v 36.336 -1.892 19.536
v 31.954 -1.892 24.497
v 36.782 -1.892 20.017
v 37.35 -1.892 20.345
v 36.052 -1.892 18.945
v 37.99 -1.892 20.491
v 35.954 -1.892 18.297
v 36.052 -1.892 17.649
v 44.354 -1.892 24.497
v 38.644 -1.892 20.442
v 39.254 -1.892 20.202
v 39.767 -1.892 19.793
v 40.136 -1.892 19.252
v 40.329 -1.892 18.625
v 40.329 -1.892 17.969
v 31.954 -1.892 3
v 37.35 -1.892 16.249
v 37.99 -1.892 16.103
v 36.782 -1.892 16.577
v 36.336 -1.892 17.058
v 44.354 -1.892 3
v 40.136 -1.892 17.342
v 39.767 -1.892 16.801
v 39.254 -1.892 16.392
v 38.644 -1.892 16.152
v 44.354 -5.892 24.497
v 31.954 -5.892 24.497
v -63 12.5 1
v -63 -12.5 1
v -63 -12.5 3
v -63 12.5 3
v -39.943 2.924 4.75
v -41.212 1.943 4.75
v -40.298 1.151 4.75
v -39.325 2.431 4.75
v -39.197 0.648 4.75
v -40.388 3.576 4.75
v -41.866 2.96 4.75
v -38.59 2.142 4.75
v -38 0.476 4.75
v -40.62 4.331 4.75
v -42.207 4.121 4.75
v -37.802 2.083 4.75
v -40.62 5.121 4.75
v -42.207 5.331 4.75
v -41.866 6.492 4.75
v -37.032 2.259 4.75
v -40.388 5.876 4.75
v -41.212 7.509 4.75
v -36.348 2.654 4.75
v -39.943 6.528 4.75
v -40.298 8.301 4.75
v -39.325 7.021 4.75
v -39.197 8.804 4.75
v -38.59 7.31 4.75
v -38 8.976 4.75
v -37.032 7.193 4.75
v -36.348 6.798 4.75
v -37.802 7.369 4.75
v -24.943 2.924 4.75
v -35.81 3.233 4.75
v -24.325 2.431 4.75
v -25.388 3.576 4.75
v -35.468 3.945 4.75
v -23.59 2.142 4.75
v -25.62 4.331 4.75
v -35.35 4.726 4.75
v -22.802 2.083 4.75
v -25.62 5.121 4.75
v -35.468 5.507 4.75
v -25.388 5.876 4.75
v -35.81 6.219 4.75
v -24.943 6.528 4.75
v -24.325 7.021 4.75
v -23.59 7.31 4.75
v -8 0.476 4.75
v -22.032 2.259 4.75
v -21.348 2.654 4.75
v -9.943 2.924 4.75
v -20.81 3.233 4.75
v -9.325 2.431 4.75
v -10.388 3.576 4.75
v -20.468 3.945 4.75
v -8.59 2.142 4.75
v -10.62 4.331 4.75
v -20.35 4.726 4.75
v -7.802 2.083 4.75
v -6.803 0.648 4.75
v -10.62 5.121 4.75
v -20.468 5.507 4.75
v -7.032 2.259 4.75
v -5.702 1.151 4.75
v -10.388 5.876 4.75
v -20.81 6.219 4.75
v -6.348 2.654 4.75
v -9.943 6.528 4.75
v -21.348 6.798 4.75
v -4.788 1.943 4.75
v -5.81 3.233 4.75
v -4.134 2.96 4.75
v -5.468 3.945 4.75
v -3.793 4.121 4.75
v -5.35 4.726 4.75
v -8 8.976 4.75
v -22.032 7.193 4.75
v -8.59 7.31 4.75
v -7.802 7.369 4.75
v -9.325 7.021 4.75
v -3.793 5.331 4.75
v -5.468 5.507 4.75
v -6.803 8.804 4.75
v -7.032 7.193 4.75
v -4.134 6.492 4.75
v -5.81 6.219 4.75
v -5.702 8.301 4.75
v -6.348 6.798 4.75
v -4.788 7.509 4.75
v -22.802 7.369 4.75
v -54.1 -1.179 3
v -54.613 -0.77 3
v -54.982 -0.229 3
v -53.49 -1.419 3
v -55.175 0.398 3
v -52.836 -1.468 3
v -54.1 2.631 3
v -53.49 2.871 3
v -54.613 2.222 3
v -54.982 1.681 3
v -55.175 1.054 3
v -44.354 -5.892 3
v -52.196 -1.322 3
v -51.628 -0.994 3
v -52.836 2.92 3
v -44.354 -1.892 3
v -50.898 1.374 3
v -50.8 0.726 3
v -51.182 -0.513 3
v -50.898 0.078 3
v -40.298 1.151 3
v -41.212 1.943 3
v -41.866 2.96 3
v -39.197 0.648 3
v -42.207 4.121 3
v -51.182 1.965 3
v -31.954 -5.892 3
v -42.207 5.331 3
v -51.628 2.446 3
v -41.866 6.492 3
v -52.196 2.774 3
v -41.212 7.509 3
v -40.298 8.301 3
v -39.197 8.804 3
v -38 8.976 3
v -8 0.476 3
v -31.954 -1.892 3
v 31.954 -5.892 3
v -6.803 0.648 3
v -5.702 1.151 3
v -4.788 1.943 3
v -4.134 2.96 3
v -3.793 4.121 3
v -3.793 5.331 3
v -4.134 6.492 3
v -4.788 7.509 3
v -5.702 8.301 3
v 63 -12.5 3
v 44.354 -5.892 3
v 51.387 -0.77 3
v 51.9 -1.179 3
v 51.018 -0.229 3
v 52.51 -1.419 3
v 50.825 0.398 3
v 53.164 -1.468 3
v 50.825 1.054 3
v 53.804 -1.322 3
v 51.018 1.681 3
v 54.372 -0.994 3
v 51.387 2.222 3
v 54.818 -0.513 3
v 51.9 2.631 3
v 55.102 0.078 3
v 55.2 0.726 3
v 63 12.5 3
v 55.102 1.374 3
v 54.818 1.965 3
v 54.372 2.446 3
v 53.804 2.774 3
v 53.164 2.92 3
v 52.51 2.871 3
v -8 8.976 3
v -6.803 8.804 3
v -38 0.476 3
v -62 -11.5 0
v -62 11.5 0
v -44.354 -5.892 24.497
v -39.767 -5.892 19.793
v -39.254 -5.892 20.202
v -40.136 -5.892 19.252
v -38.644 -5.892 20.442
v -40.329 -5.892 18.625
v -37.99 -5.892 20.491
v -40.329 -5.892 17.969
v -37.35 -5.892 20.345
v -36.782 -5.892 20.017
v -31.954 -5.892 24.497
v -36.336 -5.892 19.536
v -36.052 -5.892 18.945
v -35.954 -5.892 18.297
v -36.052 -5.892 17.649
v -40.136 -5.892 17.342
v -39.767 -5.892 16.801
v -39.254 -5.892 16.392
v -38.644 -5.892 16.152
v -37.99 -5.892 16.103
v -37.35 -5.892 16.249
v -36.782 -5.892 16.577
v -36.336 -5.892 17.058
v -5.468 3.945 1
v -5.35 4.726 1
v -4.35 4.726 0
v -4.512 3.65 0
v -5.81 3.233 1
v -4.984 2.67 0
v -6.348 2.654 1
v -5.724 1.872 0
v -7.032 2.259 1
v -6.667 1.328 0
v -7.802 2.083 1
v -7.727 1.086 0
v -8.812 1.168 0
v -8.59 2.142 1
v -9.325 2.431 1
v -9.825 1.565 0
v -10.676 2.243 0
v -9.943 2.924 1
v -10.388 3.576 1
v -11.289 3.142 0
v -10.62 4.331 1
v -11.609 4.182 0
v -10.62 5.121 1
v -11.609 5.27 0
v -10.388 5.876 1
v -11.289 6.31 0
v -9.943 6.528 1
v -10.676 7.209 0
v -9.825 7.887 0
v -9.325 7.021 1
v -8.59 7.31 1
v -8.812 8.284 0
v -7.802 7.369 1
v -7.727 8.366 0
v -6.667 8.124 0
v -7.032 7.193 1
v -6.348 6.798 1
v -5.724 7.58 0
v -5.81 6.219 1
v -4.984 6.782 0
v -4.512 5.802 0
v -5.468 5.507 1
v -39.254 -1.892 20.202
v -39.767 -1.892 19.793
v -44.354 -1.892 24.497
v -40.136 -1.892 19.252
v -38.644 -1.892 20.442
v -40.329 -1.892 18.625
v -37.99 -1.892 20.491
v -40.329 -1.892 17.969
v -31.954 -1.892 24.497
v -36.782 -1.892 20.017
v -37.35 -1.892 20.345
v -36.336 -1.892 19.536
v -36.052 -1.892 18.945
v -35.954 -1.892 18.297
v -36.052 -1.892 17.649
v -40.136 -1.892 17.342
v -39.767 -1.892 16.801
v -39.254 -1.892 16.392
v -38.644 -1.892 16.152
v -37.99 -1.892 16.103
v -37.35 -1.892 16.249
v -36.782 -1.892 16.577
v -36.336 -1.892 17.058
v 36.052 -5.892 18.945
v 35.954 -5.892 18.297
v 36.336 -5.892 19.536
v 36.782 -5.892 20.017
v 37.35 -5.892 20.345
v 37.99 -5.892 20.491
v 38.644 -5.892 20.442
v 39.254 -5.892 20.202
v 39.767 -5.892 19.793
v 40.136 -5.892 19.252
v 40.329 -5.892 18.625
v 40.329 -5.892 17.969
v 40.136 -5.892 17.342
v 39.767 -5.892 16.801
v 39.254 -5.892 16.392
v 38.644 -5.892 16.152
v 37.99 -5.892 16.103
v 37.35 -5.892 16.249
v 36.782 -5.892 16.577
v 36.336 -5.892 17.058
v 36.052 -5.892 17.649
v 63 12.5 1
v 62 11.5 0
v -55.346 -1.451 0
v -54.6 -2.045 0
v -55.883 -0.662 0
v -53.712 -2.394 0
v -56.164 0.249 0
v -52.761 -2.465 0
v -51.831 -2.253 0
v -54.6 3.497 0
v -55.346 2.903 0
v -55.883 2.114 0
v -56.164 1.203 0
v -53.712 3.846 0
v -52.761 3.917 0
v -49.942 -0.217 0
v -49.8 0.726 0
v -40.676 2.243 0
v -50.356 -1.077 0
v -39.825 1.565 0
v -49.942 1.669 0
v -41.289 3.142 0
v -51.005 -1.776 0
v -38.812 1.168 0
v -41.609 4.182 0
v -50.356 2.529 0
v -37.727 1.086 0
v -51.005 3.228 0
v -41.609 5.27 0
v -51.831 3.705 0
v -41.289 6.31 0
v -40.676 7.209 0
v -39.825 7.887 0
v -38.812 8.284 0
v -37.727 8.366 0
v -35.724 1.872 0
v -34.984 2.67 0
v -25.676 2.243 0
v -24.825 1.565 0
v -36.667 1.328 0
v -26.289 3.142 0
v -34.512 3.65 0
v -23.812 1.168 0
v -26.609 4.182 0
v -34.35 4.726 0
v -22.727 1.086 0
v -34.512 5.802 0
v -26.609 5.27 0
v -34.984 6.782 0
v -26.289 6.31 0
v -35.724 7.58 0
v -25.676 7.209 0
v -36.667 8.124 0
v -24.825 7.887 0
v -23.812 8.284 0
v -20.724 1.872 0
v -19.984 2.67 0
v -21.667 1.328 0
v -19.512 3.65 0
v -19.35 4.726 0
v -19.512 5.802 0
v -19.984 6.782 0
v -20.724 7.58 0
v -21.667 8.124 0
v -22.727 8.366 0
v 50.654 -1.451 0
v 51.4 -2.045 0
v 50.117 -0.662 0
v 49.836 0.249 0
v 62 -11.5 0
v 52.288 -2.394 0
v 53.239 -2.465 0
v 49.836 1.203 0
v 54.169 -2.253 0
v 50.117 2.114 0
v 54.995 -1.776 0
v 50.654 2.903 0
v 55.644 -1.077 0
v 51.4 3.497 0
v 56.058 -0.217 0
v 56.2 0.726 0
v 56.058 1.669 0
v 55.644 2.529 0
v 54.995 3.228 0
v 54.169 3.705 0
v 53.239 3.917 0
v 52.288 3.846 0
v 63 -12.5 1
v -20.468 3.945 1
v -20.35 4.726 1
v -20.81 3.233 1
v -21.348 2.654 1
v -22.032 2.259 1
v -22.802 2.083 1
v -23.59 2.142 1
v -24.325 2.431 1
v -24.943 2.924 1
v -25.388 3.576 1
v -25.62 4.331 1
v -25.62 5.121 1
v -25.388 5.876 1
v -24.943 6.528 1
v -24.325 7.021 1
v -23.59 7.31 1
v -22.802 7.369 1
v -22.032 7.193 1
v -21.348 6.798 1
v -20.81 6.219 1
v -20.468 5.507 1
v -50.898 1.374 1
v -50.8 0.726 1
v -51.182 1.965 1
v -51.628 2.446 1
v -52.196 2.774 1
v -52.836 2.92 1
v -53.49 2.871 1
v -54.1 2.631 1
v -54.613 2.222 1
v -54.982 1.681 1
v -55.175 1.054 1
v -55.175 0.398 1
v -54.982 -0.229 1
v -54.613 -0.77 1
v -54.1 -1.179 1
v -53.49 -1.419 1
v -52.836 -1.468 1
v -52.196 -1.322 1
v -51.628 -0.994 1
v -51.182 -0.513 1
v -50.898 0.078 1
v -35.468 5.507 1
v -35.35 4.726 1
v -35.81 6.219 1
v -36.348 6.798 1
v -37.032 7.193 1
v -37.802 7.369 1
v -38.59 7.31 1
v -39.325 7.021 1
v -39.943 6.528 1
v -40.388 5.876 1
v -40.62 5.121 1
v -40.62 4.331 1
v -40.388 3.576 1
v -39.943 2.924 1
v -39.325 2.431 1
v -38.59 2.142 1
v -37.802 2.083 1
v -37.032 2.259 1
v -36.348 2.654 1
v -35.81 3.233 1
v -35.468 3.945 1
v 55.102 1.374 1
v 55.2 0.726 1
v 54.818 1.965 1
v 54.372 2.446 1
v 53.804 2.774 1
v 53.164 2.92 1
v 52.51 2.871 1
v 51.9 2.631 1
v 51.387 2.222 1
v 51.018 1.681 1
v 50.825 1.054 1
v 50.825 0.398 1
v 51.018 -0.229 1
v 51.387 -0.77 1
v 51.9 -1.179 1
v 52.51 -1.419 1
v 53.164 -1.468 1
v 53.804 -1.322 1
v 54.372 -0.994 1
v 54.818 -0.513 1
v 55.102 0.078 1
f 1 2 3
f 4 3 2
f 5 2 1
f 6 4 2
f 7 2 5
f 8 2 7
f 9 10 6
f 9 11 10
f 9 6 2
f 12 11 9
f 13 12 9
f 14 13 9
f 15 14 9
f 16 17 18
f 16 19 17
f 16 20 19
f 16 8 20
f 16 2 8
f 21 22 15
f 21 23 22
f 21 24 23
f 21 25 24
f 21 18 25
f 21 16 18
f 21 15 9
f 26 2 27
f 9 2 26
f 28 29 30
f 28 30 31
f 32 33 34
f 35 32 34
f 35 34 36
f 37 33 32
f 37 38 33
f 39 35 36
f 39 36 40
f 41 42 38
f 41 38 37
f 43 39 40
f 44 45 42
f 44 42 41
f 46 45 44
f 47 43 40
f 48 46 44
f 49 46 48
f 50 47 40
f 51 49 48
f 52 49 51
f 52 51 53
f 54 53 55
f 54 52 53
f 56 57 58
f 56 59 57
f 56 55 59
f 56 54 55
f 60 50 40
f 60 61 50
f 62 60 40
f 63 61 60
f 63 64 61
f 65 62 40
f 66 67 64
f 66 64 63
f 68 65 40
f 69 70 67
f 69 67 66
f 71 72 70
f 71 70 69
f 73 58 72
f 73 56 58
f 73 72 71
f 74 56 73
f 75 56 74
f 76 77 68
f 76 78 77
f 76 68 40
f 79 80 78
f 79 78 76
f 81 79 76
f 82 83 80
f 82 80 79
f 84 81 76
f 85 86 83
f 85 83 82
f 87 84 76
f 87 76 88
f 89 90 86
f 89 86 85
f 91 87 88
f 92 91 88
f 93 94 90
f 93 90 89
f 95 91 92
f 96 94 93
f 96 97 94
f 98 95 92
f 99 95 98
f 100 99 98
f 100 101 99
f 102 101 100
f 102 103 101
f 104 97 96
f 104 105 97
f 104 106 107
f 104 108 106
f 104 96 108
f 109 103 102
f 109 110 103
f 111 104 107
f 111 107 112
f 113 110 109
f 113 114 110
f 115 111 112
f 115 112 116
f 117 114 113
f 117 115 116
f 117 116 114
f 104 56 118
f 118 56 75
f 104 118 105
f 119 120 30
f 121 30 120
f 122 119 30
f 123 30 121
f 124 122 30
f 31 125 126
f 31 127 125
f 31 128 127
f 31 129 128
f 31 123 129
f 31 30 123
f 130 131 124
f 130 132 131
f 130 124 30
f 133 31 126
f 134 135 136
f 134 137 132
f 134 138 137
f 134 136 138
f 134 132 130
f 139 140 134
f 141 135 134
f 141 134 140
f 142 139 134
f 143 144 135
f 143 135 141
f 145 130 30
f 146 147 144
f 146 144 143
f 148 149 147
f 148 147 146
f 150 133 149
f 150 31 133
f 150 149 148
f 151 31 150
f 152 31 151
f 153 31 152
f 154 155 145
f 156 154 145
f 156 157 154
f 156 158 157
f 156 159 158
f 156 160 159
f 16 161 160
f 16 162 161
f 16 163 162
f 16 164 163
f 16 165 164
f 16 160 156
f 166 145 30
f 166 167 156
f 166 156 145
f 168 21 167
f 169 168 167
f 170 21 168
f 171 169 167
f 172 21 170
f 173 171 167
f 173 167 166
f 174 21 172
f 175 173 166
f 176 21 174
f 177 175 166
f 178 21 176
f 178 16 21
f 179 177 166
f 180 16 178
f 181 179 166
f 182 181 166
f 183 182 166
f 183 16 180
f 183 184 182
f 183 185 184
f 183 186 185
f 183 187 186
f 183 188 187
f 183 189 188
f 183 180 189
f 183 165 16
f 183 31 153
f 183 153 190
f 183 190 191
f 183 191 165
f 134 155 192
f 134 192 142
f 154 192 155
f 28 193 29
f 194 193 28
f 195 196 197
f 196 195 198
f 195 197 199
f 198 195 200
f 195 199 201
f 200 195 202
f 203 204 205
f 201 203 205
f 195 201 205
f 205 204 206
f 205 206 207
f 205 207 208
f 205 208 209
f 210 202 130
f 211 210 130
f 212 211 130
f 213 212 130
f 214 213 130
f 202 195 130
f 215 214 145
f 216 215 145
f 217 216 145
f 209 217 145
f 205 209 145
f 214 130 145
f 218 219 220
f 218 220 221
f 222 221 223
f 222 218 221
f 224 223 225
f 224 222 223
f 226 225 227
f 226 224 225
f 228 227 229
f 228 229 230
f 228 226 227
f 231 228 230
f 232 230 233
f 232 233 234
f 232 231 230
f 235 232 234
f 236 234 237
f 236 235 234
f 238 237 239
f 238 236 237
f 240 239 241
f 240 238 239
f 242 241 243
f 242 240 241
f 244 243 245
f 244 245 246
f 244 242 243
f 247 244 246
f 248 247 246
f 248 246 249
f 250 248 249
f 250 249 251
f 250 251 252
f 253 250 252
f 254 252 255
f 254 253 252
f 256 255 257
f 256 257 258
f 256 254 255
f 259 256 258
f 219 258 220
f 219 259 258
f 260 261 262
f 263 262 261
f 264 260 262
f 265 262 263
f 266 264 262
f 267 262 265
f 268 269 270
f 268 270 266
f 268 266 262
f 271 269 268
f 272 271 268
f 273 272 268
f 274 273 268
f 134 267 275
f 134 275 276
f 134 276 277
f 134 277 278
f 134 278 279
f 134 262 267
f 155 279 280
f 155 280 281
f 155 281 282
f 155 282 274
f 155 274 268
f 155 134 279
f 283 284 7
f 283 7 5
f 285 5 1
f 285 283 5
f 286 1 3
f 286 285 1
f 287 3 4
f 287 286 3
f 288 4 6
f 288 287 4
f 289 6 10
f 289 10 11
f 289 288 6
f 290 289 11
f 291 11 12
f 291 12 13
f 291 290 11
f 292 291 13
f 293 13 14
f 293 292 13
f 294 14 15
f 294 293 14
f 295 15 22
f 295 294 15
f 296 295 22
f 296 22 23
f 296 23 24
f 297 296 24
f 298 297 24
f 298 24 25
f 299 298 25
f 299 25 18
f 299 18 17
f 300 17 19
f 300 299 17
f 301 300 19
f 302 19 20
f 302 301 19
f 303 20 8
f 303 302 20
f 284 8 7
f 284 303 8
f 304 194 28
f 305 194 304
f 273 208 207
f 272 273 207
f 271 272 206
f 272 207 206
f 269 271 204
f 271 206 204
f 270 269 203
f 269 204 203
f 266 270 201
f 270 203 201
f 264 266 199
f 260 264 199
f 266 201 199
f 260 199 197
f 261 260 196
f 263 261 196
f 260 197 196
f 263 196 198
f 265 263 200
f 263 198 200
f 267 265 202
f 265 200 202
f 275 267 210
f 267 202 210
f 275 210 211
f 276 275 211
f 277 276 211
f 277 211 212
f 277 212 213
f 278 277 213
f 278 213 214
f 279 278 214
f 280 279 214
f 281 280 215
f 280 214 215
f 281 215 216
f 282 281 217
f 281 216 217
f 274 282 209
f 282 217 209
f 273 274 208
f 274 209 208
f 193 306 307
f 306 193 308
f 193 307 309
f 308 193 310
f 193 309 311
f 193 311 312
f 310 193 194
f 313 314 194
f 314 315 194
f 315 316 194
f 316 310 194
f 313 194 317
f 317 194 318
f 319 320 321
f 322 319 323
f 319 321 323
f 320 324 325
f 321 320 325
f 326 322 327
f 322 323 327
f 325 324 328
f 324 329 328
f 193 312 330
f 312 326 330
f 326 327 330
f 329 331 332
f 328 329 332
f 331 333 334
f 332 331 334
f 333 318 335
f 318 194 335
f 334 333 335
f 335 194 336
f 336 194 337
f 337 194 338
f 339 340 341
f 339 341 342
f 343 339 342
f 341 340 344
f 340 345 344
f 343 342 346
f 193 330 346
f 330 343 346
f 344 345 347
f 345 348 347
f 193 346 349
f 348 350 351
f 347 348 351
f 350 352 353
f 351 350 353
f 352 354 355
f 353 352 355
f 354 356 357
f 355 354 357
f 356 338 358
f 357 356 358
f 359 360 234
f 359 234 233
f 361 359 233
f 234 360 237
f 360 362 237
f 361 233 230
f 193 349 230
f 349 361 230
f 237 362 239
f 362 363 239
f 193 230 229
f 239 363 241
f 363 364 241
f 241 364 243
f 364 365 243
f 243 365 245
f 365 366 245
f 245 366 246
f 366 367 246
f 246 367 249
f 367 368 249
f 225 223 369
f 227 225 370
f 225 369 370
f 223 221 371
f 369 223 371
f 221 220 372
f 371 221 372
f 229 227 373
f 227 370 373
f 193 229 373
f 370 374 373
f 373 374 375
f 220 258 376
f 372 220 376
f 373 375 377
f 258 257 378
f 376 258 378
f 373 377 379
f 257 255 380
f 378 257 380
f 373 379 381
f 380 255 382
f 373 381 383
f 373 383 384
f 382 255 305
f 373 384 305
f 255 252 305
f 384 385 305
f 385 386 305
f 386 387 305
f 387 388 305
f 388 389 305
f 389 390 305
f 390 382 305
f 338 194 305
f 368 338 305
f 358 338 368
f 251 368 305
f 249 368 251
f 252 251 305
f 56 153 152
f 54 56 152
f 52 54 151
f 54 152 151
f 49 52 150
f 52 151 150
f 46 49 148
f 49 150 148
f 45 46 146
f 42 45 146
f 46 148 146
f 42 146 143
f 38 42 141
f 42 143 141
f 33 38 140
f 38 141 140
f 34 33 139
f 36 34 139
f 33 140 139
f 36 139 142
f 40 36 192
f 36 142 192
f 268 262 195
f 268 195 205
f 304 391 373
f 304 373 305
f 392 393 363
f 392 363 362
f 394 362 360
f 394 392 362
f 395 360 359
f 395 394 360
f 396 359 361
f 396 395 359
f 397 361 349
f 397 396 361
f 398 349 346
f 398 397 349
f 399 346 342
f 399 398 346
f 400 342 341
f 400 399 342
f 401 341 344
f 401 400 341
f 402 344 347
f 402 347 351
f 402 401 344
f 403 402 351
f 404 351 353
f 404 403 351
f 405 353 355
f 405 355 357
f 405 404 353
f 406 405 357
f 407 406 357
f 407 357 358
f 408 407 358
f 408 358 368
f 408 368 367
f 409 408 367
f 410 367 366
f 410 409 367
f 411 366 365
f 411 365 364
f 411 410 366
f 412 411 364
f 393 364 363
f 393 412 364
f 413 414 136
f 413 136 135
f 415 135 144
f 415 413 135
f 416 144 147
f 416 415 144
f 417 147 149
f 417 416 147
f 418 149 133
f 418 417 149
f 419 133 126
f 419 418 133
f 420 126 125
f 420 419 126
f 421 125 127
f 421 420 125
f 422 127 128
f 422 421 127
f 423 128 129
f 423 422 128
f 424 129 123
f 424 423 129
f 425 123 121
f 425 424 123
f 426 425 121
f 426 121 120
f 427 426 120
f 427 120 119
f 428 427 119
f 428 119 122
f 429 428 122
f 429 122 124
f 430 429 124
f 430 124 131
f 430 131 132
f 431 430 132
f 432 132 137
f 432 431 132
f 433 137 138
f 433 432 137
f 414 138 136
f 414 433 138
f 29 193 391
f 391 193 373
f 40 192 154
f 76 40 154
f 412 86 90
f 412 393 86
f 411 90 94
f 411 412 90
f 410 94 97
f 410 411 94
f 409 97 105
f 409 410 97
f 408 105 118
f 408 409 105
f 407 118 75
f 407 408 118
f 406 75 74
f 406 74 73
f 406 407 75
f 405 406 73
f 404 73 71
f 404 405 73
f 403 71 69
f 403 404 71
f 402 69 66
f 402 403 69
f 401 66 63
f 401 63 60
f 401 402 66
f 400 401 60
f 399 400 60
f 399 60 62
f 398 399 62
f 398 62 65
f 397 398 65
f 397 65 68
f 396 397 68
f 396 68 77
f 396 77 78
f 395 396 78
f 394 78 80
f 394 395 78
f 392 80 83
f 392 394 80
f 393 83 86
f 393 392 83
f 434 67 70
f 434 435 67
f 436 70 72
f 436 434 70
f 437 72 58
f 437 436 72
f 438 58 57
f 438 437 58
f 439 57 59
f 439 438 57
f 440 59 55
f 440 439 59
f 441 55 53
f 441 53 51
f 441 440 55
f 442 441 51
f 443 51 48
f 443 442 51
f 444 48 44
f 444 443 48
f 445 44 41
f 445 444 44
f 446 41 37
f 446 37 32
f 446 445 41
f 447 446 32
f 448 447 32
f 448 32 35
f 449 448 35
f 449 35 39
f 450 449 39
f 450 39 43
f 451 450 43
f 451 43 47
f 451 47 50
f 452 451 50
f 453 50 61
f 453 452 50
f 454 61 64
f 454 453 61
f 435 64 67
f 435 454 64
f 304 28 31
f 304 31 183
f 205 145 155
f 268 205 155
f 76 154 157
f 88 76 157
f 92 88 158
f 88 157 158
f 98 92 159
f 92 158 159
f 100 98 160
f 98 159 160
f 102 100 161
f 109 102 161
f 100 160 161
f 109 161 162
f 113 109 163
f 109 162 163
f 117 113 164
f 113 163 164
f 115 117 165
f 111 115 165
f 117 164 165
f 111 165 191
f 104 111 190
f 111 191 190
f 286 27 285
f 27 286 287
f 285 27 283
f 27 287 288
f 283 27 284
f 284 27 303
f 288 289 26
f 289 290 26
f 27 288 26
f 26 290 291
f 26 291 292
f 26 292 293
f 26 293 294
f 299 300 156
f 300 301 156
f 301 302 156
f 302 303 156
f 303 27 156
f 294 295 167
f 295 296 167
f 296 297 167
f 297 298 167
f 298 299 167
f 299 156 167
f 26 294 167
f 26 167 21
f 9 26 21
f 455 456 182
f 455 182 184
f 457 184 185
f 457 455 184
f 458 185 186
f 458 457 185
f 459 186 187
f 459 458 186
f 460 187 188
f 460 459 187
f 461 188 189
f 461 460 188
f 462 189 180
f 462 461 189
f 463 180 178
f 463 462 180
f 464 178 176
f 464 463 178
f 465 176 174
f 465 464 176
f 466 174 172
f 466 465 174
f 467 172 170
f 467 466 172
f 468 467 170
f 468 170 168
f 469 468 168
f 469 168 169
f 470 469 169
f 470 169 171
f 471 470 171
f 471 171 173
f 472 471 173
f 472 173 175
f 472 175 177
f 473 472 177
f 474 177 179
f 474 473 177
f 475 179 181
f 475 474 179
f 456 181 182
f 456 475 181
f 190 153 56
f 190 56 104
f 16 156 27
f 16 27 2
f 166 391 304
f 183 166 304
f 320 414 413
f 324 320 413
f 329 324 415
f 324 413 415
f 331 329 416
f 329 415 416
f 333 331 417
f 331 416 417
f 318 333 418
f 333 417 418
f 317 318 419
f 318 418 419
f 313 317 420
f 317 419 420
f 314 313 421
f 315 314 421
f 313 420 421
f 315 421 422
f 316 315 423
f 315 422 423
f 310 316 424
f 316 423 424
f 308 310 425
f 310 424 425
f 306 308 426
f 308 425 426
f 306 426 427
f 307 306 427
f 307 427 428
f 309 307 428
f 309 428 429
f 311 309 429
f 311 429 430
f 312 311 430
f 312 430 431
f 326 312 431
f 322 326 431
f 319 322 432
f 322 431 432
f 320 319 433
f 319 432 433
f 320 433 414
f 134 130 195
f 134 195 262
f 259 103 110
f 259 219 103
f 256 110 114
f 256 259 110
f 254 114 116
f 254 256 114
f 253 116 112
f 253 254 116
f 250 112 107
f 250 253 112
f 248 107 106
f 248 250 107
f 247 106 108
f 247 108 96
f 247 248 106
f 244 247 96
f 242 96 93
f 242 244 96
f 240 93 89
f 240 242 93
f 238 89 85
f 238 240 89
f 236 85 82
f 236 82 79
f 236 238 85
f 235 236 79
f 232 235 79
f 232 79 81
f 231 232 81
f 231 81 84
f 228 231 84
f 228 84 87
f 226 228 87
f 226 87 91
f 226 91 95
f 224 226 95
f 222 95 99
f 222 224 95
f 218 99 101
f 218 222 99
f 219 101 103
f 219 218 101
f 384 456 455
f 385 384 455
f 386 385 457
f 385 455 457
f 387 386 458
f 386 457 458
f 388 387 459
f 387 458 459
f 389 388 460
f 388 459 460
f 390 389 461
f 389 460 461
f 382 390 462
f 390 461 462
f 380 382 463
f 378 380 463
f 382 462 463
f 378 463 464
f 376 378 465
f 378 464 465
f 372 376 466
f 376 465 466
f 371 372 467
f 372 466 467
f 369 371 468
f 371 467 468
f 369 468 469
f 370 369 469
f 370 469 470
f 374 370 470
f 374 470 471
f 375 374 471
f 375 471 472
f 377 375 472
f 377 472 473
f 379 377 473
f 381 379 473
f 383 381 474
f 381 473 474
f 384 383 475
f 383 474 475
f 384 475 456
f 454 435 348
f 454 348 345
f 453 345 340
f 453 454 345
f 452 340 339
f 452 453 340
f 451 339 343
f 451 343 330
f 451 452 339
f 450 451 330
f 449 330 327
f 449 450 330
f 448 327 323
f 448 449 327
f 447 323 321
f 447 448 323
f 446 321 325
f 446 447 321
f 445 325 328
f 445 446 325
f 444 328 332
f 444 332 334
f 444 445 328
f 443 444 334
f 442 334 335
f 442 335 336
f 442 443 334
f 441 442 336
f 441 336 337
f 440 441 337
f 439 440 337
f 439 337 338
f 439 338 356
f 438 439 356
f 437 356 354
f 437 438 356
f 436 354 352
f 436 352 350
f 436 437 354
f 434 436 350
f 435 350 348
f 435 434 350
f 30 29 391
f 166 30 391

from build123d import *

# Parameters (mm, degrees)
SKETCH_W        = 126
SKETCH_H        = 25
SKETCH_R        = 2.2
PAD_DEPTH       = 3
SKETCH001_W     = 12.4
SKETCH001_H     = 4
PAD001_DEPTH    = 21.497
SKETCH002_R     = 2.2
POCKET_DEPTH    = 4
CHAMFER_SIZE    = 1
SKETCH003_R     = 2.65
POCKET001_DEPTH = 24.498
CHAMFER001_SIZE = 1
SKETCH004_R     = 2.65
PAD002_DEPTH    = 1.75


with BuildPart() as part:
    # Sketch → Pad (new body)
    with BuildSketch(Plane.XY):
        Rectangle(SKETCH_W, SKETCH_H)
        with Locations((-53, 0.726)):
            Circle(SKETCH_R, mode=Mode.SUBTRACT)
        with Locations((53, 0.726)):
            Circle(SKETCH_R, mode=Mode.SUBTRACT)
    extrude(amount=PAD_DEPTH)

    # Sketch001 (on Face8 of Pad) → Pad001 (join)
    with BuildSketch(Plane.XY.offset(3)):
        with Locations((-38.154, -3.892)):
            Rectangle(SKETCH001_W, SKETCH001_H)
        with Locations((38.154, -3.892)):
            Rectangle(SKETCH001_W, SKETCH001_H)
    extrude(amount=PAD001_DEPTH)

    # Sketch002 (on Face11 of Pad001) → Pocket (cut)
    with BuildSketch(Plane.XZ.offset(5.892)):
        with Locations((-38.154, 18.297)):
            Circle(SKETCH002_R)
    pocket = extrude(amount=-POCKET_DEPTH, mode=Mode.SUBTRACT)

    # Mirrored: Pocket across Sketch002 V_Axis
    add(pocket.mirror(Plane(origin=(0, -5.892, 0), x_dir=(0, -1, 0), z_dir=(1, 0, 0))), mode=Mode.SUBTRACT)

    # Chamfer
    chamfer_edges = [part.edges().sort_by_distance(p)[0] for p in [
        (0, 12.5, 0),
        (63, 0, 0),
        (0, -12.5, 0),
        (-63, 0, 0),
        (50.8, 0.726, 0),
        (-55.2, 0.726, 0),
    ]]
    chamfer(chamfer_edges, length=CHAMFER_SIZE)

    # Sketch003 (on Face8 of Chamfer) → Pocket001 (cut, through all)
    with BuildSketch(Plane(origin=(0, 0, 0), x_dir=(1, 0, 0), z_dir=(0, 0, -1))):
        with Locations((-38, -4.726)):
            Circle(SKETCH003_R)
        with Locations((-23, -4.726)):
            Circle(SKETCH003_R)
        with Locations((-8, -4.726)):
            Circle(SKETCH003_R)
    extrude(amount=-POCKET001_DEPTH, mode=Mode.SUBTRACT)

    # Chamfer001
    chamfer001_edges = [part.edges().sort_by_distance(p)[0] for p in [
        (-10.65, 4.726, 0),
        (-25.65, 4.726, 0),
        (-40.65, 4.726, 0),
    ]]
    chamfer(chamfer001_edges, length=CHAMFER001_SIZE)

    # Sketch004 (on Face20 of Chamfer001) → Pad002 (join)
    with BuildSketch(Plane.XY.offset(3)):
        with BuildLine():
            ThreePointArc((-38, 8.976), (-42.25, 4.726), (-38, 0.476))
            Line((-38, 0.476), (-8, 0.476))
            ThreePointArc((-8, 0.476), (-3.75, 4.726), (-8, 8.976))
            Line((-38, 8.976), (-8, 8.976))
        make_face()
        with Locations((-38, 4.726)):
            Circle(SKETCH004_R, mode=Mode.SUBTRACT)
        with Locations((-23, 4.726)):
            Circle(SKETCH004_R, mode=Mode.SUBTRACT)
        with Locations((-8, 4.726)):
            Circle(SKETCH004_R, mode=Mode.SUBTRACT)
    extrude(amount=PAD002_DEPTH)


solid = part.part
